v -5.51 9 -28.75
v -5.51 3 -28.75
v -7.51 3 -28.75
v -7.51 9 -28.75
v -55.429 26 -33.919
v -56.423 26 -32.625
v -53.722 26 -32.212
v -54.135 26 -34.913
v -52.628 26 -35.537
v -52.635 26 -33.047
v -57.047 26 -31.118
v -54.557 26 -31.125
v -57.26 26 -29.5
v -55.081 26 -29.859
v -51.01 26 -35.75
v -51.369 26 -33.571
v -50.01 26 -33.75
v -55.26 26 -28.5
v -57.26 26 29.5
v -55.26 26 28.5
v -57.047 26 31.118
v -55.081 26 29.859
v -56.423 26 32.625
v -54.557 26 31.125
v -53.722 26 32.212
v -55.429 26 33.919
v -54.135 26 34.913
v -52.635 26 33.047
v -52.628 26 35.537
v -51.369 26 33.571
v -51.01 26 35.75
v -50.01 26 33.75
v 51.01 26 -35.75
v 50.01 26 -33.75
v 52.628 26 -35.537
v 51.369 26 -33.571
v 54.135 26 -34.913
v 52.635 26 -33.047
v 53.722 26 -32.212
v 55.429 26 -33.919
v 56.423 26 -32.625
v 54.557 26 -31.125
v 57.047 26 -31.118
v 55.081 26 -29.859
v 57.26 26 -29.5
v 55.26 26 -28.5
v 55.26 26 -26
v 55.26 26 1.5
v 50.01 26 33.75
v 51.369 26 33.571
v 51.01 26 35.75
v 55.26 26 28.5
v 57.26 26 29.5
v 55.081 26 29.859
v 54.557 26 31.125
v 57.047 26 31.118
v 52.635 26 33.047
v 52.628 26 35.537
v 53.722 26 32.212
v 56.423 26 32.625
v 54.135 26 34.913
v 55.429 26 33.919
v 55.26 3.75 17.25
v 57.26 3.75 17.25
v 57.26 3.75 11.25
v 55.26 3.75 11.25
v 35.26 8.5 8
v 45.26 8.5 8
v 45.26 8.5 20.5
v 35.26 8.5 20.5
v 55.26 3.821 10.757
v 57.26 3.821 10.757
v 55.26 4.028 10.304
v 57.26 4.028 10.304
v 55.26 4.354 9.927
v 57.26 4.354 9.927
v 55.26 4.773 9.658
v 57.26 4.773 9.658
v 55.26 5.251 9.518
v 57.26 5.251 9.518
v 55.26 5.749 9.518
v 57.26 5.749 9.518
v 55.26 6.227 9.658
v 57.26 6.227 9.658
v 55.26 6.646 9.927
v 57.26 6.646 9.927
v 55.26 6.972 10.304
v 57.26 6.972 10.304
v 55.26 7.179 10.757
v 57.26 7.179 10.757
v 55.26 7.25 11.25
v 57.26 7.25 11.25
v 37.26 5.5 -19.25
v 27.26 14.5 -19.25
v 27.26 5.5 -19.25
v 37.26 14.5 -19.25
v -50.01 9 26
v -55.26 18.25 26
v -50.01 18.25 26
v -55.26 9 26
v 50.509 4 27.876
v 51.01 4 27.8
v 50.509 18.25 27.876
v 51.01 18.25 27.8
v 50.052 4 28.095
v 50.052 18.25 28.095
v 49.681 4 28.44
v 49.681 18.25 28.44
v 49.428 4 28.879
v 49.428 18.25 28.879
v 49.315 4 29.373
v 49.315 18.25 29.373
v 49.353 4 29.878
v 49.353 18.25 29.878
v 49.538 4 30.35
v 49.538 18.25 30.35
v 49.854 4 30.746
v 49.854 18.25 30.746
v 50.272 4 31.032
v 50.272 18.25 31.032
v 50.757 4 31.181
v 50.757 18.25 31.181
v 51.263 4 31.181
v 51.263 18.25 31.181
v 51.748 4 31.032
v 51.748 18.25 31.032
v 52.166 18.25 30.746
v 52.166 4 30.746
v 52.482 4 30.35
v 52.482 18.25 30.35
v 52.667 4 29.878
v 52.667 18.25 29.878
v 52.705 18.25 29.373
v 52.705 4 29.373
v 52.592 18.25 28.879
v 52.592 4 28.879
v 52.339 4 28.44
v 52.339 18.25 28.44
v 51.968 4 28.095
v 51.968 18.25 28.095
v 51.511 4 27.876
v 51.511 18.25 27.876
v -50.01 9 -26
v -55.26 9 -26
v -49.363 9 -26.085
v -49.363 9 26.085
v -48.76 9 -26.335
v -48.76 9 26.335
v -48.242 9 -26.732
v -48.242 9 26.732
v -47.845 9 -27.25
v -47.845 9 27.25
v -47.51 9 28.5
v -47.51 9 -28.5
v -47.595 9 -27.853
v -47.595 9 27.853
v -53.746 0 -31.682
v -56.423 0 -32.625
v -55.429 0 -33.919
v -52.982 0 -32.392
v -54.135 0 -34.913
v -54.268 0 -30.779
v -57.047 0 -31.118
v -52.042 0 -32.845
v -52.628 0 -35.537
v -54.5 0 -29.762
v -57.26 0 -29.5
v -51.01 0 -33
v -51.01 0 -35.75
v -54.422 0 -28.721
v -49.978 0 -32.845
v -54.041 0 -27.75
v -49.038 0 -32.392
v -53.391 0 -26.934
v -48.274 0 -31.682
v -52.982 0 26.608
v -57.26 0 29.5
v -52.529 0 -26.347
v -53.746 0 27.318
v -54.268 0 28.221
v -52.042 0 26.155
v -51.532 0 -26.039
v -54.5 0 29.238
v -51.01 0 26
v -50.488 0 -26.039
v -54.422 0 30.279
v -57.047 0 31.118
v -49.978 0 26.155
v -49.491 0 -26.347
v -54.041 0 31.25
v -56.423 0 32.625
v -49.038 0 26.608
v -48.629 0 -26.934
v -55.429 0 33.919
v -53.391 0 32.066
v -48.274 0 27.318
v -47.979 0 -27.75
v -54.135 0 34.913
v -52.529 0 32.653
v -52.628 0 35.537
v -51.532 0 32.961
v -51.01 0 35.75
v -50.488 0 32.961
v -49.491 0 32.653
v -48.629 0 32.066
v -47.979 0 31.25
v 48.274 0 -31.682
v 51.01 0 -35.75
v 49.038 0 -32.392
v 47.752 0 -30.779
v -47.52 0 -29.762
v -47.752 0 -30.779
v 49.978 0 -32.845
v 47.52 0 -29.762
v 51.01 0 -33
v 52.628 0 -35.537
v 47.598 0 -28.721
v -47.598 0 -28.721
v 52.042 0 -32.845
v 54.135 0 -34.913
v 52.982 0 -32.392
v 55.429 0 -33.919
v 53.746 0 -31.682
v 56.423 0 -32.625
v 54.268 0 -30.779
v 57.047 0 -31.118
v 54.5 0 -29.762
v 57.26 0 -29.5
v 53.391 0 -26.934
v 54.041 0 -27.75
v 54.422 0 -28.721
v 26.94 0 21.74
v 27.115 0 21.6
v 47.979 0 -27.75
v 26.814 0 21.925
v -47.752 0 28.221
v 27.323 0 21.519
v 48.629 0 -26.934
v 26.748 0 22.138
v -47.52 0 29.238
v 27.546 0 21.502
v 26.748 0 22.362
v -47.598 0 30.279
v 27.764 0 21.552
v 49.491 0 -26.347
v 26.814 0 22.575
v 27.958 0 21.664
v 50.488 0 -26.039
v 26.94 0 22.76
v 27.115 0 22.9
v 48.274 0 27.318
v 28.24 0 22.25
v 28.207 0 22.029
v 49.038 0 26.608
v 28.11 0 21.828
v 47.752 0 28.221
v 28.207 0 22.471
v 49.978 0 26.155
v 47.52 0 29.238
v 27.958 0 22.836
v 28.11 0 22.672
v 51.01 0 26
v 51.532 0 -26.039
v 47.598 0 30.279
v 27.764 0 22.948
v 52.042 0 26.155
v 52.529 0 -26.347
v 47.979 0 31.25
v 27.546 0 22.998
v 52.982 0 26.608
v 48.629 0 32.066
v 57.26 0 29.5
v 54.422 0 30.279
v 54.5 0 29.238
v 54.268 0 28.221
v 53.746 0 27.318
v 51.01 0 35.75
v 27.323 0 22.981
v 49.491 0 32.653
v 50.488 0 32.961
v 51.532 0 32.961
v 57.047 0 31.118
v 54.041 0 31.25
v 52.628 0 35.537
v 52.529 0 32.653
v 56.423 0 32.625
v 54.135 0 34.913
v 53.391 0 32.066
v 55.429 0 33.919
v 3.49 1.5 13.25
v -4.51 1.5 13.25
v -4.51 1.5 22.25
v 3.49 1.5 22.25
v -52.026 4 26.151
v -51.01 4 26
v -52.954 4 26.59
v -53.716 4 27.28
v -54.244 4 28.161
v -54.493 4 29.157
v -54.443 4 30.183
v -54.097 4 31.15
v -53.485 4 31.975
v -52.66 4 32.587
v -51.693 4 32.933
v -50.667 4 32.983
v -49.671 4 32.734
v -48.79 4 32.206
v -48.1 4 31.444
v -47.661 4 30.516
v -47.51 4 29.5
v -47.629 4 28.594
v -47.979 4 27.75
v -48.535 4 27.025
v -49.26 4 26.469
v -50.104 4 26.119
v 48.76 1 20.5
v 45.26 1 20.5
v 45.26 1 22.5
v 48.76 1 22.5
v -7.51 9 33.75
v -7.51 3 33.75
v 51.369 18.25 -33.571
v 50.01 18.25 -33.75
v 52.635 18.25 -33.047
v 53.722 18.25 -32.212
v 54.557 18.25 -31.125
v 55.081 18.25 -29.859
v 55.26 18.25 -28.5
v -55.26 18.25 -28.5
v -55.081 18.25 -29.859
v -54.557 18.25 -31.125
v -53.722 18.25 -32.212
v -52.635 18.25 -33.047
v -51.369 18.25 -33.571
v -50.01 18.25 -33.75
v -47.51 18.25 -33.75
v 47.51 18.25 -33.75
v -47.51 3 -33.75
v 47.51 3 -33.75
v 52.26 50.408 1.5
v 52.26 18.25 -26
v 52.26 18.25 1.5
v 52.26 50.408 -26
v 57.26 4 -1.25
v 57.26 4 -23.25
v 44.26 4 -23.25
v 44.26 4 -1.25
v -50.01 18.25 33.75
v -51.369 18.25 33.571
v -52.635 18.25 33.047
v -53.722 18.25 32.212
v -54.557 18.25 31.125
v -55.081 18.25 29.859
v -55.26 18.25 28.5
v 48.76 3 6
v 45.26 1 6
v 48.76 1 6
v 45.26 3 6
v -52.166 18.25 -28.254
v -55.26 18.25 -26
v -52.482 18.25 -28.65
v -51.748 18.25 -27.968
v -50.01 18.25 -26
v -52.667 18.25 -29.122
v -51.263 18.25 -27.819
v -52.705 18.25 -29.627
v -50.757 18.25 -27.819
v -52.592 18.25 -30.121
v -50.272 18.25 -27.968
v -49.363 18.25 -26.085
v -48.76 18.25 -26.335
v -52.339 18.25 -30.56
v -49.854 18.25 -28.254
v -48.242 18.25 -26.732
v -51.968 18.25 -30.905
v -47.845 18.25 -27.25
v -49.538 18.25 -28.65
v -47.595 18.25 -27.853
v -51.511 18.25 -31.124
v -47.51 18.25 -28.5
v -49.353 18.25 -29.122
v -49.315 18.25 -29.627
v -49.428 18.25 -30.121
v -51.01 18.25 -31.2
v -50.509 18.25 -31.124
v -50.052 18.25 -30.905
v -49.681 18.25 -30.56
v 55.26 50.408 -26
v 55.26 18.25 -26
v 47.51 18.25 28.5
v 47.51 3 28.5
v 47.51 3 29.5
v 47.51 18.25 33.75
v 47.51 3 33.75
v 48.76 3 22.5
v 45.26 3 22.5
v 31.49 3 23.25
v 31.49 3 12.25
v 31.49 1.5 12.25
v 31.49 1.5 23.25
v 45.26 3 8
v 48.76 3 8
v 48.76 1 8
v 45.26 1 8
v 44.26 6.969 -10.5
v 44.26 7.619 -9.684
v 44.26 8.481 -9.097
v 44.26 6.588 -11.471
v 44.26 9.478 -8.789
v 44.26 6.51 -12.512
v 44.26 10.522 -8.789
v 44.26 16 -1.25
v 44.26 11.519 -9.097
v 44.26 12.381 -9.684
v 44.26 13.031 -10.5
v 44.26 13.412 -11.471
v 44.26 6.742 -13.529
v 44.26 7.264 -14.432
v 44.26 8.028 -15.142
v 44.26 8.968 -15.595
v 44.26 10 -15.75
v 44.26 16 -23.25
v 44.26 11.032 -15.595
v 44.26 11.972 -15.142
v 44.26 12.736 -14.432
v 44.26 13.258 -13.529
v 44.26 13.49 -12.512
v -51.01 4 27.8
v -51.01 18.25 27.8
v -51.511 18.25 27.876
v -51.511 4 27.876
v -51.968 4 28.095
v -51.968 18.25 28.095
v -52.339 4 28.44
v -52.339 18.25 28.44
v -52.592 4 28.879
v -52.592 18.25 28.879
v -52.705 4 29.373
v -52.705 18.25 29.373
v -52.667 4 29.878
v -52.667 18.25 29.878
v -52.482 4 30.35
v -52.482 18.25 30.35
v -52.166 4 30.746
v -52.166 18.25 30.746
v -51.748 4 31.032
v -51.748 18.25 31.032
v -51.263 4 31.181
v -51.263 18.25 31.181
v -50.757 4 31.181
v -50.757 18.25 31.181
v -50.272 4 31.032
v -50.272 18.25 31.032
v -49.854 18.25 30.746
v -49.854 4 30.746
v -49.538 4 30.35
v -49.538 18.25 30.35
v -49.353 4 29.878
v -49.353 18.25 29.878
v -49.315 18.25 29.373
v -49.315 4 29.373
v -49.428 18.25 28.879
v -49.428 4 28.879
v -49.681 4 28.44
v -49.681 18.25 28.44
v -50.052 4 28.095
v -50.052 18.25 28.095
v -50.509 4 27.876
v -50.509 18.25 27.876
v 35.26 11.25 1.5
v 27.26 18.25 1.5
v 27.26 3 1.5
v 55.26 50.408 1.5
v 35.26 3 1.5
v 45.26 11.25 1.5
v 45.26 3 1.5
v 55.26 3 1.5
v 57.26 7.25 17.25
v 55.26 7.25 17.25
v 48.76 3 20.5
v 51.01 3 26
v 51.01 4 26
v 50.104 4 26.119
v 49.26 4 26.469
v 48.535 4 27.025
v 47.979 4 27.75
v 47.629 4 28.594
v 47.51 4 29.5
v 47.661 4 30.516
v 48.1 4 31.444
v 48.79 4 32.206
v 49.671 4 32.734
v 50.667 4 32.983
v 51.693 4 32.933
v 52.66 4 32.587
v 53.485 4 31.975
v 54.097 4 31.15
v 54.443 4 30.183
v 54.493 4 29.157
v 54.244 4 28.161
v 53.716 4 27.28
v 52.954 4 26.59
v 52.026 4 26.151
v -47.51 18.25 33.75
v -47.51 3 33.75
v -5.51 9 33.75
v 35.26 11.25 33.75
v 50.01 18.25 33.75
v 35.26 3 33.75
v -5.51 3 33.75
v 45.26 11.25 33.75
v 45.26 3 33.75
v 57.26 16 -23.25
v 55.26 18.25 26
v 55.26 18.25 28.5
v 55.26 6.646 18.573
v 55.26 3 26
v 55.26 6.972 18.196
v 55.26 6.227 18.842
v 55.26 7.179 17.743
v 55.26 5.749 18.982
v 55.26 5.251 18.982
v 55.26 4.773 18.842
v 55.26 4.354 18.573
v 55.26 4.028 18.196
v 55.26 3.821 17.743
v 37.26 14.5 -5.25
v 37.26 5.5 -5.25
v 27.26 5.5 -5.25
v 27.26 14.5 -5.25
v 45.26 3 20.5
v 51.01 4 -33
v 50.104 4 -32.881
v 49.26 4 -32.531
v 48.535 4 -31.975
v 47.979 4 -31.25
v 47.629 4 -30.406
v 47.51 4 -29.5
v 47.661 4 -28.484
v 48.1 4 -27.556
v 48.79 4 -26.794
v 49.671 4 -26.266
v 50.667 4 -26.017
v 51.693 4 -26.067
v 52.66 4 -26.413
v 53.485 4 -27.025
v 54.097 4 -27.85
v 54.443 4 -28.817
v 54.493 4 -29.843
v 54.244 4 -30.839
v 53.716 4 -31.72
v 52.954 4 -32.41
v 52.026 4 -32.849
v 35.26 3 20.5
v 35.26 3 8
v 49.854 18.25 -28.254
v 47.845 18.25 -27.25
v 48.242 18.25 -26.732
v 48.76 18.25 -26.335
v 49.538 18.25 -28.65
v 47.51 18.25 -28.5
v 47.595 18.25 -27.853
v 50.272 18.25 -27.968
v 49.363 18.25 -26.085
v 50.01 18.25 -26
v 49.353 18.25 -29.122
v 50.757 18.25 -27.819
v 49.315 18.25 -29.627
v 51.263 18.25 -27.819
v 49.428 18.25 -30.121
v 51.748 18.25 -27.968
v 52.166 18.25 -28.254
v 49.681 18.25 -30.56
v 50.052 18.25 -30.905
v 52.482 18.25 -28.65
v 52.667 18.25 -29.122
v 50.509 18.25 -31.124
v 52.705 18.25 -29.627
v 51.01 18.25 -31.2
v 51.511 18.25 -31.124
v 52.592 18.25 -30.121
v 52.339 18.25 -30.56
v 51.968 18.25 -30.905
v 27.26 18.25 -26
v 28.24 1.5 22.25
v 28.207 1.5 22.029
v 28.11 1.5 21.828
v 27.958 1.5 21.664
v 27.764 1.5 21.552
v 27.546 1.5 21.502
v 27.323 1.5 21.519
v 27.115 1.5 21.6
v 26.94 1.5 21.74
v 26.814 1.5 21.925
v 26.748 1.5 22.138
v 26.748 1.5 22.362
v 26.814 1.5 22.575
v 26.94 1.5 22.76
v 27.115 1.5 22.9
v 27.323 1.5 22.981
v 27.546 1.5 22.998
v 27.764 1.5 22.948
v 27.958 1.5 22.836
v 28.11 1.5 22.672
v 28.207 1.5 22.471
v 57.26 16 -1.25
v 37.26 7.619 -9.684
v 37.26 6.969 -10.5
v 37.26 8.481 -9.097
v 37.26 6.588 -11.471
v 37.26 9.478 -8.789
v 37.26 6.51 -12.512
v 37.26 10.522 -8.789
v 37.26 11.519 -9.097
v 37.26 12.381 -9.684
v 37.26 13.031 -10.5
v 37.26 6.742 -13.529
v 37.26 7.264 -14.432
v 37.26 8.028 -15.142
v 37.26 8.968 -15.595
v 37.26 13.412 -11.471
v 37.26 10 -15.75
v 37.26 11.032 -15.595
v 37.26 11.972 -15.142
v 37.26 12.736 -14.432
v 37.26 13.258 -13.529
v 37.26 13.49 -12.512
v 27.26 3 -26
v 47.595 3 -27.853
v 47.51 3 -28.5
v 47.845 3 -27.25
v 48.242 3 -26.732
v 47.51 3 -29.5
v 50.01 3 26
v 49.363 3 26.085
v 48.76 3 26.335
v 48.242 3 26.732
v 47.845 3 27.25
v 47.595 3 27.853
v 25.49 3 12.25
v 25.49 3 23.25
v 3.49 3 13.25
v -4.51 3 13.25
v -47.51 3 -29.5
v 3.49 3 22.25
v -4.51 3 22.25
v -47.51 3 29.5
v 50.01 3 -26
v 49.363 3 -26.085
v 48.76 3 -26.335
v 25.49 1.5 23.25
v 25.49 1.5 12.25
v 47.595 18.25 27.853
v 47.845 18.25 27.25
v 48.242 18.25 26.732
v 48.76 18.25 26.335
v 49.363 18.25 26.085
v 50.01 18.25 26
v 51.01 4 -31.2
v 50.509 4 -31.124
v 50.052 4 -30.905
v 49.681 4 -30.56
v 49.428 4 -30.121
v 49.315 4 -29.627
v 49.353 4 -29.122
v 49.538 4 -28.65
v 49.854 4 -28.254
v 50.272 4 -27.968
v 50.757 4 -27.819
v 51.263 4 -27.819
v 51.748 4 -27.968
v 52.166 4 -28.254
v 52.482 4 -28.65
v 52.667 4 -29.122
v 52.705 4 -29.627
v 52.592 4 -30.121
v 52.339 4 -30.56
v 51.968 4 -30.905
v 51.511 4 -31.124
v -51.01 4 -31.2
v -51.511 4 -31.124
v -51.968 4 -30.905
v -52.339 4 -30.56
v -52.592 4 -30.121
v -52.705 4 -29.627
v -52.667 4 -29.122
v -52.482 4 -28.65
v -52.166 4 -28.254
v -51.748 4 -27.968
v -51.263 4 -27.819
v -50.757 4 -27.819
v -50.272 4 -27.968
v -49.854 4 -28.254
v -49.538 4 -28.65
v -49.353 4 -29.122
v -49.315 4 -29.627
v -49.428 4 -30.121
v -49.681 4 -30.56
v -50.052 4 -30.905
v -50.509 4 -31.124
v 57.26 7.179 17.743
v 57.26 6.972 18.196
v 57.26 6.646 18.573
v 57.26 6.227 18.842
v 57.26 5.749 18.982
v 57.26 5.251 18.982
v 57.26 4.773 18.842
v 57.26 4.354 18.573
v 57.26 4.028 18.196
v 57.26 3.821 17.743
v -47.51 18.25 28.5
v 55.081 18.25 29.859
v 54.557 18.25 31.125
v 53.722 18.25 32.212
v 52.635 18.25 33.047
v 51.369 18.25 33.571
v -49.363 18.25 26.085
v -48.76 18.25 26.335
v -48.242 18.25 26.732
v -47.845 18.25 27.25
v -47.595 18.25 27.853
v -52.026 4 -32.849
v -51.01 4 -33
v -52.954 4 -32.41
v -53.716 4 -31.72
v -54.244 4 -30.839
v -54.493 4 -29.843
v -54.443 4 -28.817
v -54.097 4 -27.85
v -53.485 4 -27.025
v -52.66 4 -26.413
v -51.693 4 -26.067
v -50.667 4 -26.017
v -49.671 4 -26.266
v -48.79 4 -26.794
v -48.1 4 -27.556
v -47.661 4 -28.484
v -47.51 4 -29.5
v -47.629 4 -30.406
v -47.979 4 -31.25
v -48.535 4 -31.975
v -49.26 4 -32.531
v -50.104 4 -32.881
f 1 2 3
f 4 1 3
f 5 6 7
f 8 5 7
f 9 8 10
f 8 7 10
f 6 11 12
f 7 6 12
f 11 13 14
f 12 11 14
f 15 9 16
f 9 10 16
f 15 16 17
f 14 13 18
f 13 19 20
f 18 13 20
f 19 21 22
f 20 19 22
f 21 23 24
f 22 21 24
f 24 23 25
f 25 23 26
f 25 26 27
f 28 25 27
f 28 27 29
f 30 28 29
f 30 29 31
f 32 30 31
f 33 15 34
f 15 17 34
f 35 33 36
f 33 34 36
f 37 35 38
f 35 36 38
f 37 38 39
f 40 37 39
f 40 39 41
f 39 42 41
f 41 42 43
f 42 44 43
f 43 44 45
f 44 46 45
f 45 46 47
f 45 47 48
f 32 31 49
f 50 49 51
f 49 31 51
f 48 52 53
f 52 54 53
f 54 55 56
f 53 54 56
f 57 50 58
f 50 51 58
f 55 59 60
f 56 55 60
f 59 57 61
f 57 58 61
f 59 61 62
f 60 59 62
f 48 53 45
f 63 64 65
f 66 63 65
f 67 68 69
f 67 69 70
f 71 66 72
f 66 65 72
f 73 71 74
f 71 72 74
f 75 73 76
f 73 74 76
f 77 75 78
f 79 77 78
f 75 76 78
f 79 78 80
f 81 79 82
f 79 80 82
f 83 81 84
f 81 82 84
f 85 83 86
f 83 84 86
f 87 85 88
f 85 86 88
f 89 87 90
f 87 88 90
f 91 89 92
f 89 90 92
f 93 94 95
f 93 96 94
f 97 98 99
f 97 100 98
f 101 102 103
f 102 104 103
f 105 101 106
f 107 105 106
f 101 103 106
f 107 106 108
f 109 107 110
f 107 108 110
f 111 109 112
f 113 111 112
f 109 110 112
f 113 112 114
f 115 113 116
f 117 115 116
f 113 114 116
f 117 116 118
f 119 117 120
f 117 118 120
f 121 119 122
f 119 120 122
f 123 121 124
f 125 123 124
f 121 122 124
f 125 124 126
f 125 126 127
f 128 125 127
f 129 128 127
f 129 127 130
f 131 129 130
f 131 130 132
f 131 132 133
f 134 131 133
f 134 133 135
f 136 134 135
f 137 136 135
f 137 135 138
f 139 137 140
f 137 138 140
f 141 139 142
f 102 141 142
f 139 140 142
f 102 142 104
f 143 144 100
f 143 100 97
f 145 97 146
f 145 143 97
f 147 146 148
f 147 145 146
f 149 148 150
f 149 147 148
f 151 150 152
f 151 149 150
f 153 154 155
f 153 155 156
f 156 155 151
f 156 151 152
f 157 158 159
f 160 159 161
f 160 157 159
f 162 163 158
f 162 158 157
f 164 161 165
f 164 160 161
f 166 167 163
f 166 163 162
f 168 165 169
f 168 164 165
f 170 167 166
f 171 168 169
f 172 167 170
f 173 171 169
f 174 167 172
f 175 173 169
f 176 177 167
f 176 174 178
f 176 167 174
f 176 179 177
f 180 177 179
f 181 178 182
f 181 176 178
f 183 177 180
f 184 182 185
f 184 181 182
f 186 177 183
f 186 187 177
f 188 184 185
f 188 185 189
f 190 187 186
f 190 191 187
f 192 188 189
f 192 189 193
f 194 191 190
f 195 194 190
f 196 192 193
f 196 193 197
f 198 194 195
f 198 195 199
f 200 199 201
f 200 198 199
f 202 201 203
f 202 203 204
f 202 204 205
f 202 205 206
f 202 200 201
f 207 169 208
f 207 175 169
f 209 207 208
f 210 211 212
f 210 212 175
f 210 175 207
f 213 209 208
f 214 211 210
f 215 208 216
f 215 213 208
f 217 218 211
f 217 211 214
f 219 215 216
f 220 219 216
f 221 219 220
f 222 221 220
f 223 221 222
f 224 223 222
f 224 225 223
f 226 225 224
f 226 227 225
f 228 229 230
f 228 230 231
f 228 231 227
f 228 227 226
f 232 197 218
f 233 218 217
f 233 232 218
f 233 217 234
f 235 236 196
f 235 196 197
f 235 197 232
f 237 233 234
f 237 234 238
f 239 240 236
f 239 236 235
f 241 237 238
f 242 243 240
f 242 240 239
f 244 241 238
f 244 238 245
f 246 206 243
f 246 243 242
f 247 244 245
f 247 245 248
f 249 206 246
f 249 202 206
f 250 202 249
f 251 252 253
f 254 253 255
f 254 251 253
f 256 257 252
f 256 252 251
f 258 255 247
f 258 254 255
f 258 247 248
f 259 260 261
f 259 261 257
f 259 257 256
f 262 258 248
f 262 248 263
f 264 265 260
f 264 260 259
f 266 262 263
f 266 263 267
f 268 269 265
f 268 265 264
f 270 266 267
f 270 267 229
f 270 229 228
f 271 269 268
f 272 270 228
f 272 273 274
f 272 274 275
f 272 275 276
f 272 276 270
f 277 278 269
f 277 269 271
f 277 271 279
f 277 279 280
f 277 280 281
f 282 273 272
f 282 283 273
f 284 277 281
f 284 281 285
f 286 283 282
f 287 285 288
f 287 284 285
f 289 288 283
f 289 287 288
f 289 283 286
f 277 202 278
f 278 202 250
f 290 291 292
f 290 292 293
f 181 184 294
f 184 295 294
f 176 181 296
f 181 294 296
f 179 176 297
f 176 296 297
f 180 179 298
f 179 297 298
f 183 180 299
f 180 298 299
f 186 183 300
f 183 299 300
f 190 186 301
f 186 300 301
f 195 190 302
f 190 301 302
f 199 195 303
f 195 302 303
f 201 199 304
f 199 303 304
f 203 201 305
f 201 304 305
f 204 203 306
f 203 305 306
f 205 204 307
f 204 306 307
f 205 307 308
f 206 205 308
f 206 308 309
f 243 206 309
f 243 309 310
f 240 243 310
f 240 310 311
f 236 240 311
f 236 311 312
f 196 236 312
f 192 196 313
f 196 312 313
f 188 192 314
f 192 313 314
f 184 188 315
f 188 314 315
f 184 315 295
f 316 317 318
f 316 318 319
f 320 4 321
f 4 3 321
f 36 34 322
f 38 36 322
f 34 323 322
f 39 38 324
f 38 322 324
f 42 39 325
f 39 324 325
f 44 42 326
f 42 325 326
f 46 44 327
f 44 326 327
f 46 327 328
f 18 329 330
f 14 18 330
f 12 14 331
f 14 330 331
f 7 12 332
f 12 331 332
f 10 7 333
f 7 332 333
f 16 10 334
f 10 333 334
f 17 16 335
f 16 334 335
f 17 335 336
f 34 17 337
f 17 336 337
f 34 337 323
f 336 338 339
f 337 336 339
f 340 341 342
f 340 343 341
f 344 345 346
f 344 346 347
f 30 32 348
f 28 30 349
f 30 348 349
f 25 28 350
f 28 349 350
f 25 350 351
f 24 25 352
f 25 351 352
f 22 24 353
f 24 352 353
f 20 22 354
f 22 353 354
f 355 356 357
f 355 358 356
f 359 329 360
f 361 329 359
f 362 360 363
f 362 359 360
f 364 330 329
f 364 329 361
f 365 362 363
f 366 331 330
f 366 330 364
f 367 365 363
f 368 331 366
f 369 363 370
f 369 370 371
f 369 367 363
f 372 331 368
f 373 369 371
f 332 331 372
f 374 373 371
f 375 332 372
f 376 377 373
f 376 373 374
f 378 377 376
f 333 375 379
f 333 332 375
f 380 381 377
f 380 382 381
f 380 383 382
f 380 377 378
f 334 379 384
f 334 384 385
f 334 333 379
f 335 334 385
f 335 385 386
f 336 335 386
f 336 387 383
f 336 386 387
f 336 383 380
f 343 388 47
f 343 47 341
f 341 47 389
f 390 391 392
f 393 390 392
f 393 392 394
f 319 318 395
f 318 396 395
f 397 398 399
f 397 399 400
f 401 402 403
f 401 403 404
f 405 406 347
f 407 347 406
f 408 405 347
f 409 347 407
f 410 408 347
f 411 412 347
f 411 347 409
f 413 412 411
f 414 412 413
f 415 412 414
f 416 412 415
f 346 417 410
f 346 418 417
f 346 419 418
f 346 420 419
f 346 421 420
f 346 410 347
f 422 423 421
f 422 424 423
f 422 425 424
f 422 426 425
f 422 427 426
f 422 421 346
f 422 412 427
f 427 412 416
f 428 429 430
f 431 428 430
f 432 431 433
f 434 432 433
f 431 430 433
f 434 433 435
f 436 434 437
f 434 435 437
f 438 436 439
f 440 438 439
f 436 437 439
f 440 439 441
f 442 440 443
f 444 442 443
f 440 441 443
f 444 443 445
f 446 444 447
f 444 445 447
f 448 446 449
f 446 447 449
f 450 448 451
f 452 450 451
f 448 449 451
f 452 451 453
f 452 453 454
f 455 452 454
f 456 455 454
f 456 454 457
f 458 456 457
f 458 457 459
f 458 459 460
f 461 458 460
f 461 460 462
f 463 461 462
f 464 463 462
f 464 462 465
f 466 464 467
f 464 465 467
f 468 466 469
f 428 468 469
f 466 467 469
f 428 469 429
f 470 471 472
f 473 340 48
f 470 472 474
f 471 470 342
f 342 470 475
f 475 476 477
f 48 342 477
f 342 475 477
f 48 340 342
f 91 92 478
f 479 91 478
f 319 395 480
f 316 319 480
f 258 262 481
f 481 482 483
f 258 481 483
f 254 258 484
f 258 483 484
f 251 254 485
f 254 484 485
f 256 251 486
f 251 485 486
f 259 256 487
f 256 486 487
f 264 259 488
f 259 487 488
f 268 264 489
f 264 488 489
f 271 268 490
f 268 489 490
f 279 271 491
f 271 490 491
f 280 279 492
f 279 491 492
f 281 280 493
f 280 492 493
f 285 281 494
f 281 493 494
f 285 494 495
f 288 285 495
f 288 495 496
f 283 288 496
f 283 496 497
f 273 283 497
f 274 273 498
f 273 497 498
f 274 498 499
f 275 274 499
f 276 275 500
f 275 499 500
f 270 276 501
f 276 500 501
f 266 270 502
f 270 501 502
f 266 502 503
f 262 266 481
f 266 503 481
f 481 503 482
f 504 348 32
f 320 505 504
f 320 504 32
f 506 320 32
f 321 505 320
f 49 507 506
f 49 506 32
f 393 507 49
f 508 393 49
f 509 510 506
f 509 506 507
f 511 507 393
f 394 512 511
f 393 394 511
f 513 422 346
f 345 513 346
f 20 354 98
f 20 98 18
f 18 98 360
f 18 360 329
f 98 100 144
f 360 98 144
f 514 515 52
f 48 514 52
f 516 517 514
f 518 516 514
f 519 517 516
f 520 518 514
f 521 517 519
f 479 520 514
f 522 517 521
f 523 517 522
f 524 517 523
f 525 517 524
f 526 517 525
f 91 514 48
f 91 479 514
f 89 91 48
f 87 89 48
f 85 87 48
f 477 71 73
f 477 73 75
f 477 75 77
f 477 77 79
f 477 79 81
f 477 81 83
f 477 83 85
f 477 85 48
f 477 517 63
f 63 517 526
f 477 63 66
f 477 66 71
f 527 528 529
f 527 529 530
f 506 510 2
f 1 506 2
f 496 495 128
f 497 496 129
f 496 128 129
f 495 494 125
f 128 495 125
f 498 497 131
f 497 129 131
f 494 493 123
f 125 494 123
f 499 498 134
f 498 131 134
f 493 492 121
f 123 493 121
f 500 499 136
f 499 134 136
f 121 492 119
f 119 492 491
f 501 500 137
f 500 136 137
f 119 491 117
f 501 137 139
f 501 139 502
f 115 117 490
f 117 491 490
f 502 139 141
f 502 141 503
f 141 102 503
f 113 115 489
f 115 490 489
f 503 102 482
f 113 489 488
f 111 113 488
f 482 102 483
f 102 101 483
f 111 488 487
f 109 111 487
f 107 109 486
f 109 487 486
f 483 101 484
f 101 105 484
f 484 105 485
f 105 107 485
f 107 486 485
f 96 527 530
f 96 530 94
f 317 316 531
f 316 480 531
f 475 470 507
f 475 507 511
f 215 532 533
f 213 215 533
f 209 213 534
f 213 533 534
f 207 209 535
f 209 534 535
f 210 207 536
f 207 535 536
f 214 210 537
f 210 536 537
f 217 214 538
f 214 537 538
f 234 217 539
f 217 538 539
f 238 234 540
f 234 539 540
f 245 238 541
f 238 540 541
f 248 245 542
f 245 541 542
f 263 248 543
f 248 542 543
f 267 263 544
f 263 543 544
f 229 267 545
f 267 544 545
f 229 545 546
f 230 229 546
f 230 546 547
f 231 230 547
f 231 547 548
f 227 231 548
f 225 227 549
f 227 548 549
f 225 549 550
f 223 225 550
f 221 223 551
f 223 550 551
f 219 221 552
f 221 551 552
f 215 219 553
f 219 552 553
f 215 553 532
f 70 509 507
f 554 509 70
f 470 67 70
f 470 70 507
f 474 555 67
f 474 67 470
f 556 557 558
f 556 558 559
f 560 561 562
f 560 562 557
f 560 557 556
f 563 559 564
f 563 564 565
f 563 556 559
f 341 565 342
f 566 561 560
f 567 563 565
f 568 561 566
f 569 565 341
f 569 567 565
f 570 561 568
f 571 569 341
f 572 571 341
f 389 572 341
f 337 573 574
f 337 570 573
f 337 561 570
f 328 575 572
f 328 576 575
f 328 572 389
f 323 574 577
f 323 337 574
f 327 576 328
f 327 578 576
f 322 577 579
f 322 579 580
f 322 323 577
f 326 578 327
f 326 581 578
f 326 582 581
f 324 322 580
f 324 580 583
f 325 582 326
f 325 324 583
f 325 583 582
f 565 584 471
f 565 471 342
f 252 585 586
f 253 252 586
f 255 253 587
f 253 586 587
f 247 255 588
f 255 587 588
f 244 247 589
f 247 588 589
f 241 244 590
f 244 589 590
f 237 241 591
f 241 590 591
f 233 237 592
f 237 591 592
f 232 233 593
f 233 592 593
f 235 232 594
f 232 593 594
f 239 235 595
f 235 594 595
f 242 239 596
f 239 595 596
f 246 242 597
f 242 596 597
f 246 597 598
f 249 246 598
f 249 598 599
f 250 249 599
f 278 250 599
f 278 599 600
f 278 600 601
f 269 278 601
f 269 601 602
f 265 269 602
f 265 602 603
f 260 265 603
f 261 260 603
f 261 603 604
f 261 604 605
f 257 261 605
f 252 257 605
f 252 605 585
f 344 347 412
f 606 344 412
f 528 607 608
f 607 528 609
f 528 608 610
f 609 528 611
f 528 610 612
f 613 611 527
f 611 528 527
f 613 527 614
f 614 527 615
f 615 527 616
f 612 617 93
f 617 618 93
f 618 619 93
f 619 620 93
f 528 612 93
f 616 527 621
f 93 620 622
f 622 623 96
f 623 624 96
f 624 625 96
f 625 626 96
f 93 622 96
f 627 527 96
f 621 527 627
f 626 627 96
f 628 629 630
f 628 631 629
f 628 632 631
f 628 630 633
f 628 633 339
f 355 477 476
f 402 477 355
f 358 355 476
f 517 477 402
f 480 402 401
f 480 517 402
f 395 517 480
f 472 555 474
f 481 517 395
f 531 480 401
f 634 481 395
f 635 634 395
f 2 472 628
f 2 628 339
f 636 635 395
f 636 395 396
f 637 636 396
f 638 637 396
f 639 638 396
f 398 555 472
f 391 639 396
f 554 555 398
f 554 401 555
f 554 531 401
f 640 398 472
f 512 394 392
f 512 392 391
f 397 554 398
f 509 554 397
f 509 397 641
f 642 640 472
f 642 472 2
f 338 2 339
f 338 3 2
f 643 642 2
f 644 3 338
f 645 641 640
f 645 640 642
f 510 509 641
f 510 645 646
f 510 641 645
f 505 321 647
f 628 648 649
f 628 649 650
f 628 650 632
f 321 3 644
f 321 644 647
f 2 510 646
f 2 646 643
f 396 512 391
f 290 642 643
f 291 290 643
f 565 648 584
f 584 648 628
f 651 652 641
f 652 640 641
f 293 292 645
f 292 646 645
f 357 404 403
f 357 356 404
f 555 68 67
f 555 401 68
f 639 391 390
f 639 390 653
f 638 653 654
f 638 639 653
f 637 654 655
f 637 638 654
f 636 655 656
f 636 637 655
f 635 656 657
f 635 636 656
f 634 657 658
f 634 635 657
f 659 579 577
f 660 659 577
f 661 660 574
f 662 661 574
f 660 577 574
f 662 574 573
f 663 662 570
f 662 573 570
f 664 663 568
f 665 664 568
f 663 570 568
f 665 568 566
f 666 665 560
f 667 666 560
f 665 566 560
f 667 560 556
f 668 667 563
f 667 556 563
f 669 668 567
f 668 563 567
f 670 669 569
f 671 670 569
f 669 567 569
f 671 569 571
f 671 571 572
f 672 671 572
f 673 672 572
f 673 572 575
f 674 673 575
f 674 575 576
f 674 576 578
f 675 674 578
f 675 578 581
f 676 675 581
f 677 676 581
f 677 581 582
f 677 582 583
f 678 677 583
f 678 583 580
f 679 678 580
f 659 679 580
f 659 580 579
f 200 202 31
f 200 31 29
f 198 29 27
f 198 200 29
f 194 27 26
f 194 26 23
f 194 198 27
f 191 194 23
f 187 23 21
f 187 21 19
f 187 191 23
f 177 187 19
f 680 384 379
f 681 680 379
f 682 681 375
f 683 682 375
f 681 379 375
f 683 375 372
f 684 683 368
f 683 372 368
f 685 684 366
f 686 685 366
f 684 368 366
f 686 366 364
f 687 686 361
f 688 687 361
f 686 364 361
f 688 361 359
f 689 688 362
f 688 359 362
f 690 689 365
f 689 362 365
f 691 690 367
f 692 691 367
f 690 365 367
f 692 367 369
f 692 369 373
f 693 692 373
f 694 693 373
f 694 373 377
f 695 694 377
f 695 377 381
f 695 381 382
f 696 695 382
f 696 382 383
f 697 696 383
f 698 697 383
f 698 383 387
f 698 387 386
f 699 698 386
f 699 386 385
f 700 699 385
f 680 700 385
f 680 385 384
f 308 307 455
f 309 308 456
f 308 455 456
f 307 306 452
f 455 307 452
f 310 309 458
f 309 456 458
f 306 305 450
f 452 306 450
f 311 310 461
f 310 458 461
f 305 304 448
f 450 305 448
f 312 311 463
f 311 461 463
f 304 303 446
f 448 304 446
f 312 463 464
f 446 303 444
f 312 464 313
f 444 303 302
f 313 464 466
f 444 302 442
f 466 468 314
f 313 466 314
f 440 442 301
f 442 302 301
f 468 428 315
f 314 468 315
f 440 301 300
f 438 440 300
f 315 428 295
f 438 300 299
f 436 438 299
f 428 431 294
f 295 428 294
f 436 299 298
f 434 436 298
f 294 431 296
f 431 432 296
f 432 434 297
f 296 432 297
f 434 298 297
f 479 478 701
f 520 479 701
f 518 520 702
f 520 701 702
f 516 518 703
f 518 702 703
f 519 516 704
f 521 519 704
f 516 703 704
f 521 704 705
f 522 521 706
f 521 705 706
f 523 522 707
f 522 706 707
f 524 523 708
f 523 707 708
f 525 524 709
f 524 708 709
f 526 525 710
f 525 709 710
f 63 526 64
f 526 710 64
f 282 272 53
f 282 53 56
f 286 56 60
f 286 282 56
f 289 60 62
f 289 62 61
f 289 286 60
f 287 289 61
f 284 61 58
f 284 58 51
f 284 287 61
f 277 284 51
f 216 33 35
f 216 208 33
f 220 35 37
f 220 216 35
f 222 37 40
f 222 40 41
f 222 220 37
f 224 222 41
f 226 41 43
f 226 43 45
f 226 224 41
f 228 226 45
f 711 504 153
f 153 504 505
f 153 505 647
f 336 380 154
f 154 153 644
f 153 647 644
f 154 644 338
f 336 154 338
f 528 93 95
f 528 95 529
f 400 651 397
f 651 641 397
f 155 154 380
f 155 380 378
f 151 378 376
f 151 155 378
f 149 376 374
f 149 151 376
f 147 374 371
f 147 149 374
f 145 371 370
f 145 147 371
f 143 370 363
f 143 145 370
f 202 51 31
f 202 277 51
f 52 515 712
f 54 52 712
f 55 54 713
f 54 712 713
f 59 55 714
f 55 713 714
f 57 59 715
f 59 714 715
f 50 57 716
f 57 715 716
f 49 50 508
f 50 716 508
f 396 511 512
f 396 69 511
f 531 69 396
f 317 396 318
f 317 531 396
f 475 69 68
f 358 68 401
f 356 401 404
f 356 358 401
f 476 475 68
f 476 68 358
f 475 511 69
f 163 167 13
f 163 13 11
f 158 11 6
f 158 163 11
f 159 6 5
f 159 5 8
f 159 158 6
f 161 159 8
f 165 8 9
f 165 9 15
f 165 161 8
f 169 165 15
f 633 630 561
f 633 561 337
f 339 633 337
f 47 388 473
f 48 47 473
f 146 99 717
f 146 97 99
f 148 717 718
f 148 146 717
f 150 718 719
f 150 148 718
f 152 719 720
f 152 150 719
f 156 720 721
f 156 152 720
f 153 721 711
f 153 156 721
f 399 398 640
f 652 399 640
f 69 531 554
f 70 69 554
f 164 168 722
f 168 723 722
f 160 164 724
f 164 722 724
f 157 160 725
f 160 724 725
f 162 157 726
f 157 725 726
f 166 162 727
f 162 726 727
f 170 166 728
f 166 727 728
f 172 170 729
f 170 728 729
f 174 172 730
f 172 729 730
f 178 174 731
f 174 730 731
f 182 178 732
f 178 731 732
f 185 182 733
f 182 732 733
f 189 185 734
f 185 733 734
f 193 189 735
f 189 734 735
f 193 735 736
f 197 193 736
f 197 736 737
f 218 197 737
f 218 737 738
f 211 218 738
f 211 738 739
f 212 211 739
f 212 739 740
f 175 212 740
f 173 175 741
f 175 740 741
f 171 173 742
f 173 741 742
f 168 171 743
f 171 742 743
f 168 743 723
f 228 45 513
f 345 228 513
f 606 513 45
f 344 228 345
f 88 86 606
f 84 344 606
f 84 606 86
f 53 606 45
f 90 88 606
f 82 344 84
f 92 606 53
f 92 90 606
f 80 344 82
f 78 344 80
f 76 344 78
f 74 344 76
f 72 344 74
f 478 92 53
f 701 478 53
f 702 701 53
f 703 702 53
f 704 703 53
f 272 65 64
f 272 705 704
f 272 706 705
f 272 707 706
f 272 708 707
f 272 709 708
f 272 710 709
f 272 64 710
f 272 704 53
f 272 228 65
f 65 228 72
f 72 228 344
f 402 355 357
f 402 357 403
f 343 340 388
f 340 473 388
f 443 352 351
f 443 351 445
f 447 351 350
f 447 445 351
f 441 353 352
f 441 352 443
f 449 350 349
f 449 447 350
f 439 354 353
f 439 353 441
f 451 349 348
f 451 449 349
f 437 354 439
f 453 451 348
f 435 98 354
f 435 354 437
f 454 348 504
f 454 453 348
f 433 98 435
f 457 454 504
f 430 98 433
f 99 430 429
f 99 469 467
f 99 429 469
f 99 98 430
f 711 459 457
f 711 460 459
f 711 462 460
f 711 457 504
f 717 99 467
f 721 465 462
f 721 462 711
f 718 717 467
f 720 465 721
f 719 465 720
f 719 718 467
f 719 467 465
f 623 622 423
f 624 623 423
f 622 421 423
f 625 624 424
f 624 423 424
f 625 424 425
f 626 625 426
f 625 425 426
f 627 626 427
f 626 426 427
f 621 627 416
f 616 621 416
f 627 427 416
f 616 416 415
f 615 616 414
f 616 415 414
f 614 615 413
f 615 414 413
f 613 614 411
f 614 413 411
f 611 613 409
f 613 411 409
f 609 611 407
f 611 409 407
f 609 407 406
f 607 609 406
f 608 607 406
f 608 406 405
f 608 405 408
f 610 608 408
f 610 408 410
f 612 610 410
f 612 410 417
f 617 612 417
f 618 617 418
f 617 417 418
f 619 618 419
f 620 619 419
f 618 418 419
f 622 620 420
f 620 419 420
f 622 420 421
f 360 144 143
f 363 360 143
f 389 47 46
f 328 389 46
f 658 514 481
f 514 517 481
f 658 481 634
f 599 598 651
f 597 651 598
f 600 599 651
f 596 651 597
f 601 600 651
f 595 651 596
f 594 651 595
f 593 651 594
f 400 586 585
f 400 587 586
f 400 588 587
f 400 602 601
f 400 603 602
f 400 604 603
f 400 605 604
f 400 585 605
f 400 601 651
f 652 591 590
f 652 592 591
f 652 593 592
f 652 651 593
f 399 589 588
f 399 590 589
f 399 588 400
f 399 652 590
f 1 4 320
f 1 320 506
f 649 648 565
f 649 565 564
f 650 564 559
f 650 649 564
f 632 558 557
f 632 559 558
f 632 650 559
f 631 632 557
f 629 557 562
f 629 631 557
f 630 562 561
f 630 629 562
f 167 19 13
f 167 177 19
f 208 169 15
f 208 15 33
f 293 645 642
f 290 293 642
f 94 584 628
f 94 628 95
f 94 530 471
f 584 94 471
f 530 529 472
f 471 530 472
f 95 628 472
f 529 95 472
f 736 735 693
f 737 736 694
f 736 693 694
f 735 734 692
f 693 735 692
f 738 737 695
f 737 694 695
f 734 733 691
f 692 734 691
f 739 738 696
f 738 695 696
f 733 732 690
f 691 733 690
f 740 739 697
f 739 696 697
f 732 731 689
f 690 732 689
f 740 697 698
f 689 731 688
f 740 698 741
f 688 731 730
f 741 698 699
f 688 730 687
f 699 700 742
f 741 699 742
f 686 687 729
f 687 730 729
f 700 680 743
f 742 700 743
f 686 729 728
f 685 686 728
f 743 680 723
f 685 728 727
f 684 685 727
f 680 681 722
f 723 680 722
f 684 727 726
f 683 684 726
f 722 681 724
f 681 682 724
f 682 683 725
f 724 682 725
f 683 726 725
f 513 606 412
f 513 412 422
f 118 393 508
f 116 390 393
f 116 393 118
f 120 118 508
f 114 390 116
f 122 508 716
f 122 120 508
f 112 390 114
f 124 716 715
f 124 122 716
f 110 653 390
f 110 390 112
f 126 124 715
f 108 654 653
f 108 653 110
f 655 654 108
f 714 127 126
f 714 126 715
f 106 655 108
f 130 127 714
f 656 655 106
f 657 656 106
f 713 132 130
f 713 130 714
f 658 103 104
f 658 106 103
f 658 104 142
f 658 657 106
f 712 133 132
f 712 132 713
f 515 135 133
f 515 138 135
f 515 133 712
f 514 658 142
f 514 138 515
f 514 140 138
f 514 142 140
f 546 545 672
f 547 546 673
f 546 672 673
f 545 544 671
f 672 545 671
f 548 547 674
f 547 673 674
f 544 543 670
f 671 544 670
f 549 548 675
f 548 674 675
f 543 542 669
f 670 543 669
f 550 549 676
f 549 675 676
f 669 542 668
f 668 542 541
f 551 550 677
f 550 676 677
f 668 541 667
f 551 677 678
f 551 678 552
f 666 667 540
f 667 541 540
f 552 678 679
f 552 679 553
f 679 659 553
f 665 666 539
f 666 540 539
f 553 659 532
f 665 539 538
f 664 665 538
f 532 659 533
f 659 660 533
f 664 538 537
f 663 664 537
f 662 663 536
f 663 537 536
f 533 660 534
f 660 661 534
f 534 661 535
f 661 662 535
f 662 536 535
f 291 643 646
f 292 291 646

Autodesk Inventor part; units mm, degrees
ref_plane "YZ Plane" through (0, 0, 0) normal (1, 0, 0) x (0, 1, 0)
ref_plane "XZ Plane" through (0, 0, 0) normal (0, 1, 0) x (-1, 0, 0)
sketch "Sketch1" plane through (0, 0, 0) normal (0, 1, 0) x (-1, 0, 0)
  line L0 (-55.26, 33.75) -> (55.26, 33.75)
  line L1 (55.26, 33.75) -> (55.26, -33.75)
  line L2 (55.26, -33.75) -> (-55.26, -33.75)
  line L3 (-55.26, -33.75) -> (-55.26, 33.75)
  line L4 (-55.26, 33.75) -> (55.26, -33.75) construction
  line L5 (55.26, 33.75) -> (-55.26, -33.75) construction
  point P0 (0, 0)
  dimension "d0" = 110.52
  dimension "d1" = 67.5
extrude "Extrusion1" add sketch "Sketch1" along normal blind 3
fillet "Fillet1" radius 5.25 4 edges at (-55.26, 1.5, 33.75) (55.26, 1.5, 33.75) (55.26, 1.5, -33.75) (-55.26, 1.5, -33.75)
sketch "Sketch2" plane through (0, 0, 0) normal (0, -1, 0) x (1, 0, 0)
  arc A0 (-55.26, -28.5) -> (-50.01, -33.75) centre (-50.01, -28.5) ccw construction
  line L0 (50.01, -33.75) -> (-50.01, -33.75) construction
  arc A1 (50.01, -33.75) -> (55.26, -28.5) centre (50.01, -28.5) ccw construction
  line L1 (55.26, 28.5) -> (55.26, -28.5) construction
  arc A2 (55.26, 28.5) -> (50.01, 33.75) centre (50.01, 28.5) ccw construction
  line L2 (-50.01, 33.75) -> (50.01, 33.75) construction
  arc A3 (-50.01, 33.75) -> (-55.26, 28.5) centre (-50.01, 28.5) ccw construction
  line L3 (-55.26, -28.5) -> (-55.26, 28.5) construction
  circle A4 centre (-50.01, 28.5) radius 5.25
  line L4 (-50.01, 33.75) -> (50.01, 33.75) construction
  line L5 (-50.01, 33.75) -> (50.01, 33.75)
  line L6 (-55.26, 28.5) -> (-55.26, -28.5)
  circle A5 centre (-50.01, -28.5) radius 5.25
  line L7 (-50.01, -33.75) -> (50.01, -33.75)
  circle A6 centre (50.01, -28.5) radius 5.25
  line L8 (55.26, 28.5) -> (55.26, -28.5)
  circle A7 centre (50.01, 28.5) radius 5.25
  line L9 (51.01, 35.75) -> (-51.01, 35.75)
  line L10 (-57.26, 29.5) -> (-57.26, -29.5)
  line L11 (-51.01, -35.75) -> (51.01, -35.75)
  line L12 (57.26, -29.5) -> (57.26, 29.5)
  line L13 (57.26, 35.75) -> (-57.26, -35.75) construction
  line L14 (-57.26, 35.75) -> (57.26, -35.75) construction
  arc A8 (-51.01, 35.75) -> (-57.26, 29.5) centre (-51.01, 29.5) ccw
  arc A9 (-57.26, -29.5) -> (-51.01, -35.75) centre (-51.01, -29.5) ccw
  arc A10 (51.01, -35.75) -> (57.26, -29.5) centre (51.01, -29.5) ccw
  arc A11 (57.26, 29.5) -> (51.01, 35.75) centre (51.01, 29.5) ccw
  point P0 (0, 0)
  point P1 (55.26, -28.5)
  point P2 (50.01, 33.75)
  dimension "d5" = 2
  dimension "d6" = 2
  dimension "d7" = 6.25
  dimension "d8" = 6.25
extrude "Extrusion2" add sketch "Sketch2" against normal blind 26
sketch "Sketch3" plane through (55.26, 3, 28.5) normal (-1, 0, 0) x (0, 0, 1)
  line L0 (0, 0) -> (-57, 0) construction
  line L1 (-57, 23) -> (0, 23) construction
  line L2 (-54.5, 0) -> (-27, 0)
  line L3 (-27, 0) -> (-27, 47.408)
  line L4 (-27, 47.408) -> (-54.5, 47.408)
  line L5 (-54.5, 47.408) -> (-54.5, 0)
  line L6 (-62.25, 0) -> (-62.25, 23) construction
  point P0 (-28.5, -3)
  point P1 (-54.5, 23.704)
  point P2 (-40.75, 47.408)
  dimension "d11" = 7.75
  dimension "d12" = 27.5
  dimension "d13" = 24.408
extrude "Extrusion3" add sketch "Sketch3" along normal blind 3
sketch "Sketch4" plane through (0, 3, 0) normal (0, 1, 0) x (1, 0, 0)
  arc A0 (55.26, 28.5) -> (50.01, 33.75) centre (50.01, 28.5) ccw construction
  line L0 (50.01, 33.75) -> (-50.01, 33.75) construction
  line L1 (-50.01, -33.75) -> (50.01, -33.75) construction
  arc A1 (50.01, -33.75) -> (55.26, -28.5) centre (50.01, -28.5) ccw construction
  line L2 (55.26, -28.5) -> (55.26, -1.5) construction
  circle A2 centre (50.01, 28.5) radius 2.5
  circle A3 centre (50.01, -28.5) radius 2.5
  line L3 (47.51, -28.5) -> (47.51, -33.75)
  line L4 (55.26, -26) -> (50.01, -26)
  line L5 (0, 0) -> (0, -21.4582)
  line L6 (0, 0) -> (16.5599, 0)
  line L7 (47.51, 28.5) -> (47.51, 33.75)
  line L8 (55.26, 26) -> (50.01, 26)
  circle A4 centre (-50.01, 28.5) radius 2.5
  circle A5 centre (-50.01, -28.5) radius 2.5
  line L9 (-47.51, -28.5) -> (-47.51, -33.75)
  line L10 (-55.26, -26) -> (-50.01, -26)
  line L11 (-47.51, 28.5) -> (-47.51, 33.75)
  line L12 (-55.26, 26) -> (-50.01, 26)
  line L13 (55.26, 28.5) -> (55.26, -28.5)
  line L14 (50.01, 33.75) -> (5.9104, 33.75)
  arc A6 (55.26, 28.5) -> (50.01, 33.75) centre (50.01, 28.5) ccw
  arc A7 (50.01, -33.75) -> (55.26, -28.5) centre (50.01, -28.5) ccw
  line L15 (50.01, -33.75) -> (5.9104, -33.75)
  line L16 (-55.26, 26) -> (-55.26, 28.5) construction
  arc A8 (-50.01, 33.75) -> (-55.26, 28.5) centre (-50.01, 28.5) ccw construction
  line L17 (-50.01, 33.75) -> (50.01, 33.75) construction
  arc A9 (-55.26, -28.5) -> (-50.01, -33.75) centre (-50.01, -28.5) ccw construction
  line L18 (-55.26, -28.5) -> (-55.26, -1.5) construction
  line L19 (-55.26, 28.5) -> (-55.26, -28.5)
  line L20 (-50.01, 33.75) -> (-5.9104, 33.75)
  arc A10 (-50.01, 33.75) -> (-55.26, 28.5) centre (-50.01, 28.5) ccw
  arc A11 (-55.26, -28.5) -> (-50.01, -33.75) centre (-50.01, -28.5) ccw
  line L21 (-50.01, -33.75) -> (-5.9104, -33.75)
  point P0 (-47.51, 28.5)
  dimension "d16" = 5
  dimension "d17" = 5
extrude "Extrusion4" add sketch "Sketch4" along normal blind 15.25
ref_plane "Work Plane1" through (0, 11.25, 0) normal (0, 1, 0) x (1, 0, 0)
sketch "Sketch5" plane through (0, 3, 0) normal (0, 1, 0) x (1, 0, 0)
  line L0 (-47.51, -33.75) -> (47.51, -33.75) construction
  arc A0 (-55.26, -28.5) -> (-50.01, -33.75) centre (-50.01, -28.5) ccw construction
  line L1 (-47.51, 28.5) -> (-55.26, 28.5)
  line L2 (-55.26, 28.5) -> (-55.26, -28.5)
  line L3 (-55.26, -28.5) -> (-47.51, -28.5)
  line L4 (-47.51, -28.5) -> (-47.51, 28.5)
  line L5 (-7.51, -33.75) -> (-5.51, -33.75)
  line L6 (-5.51, -33.75) -> (-5.51, 28.75)
  line L7 (-5.51, 28.75) -> (-7.51, 28.75)
  line L8 (-7.51, 28.75) -> (-7.51, -33.75)
  line L9 (-1.51, -33.75) -> (0.49, -33.75)
  dimension "d21" = 2
  dimension "d22" = 40
extrude "Extrusion5" add sketch "Sketch5" along normal blind 6
sketch "Sketch6" plane through (0, 3, 0) normal (0, 1, 0) x (1, 0, 0)
  line L0 (55.26, -1.5) -> (52.26, -1.5) construction
  line L1 (52.26, 26) -> (27.26, 26)
  line L2 (27.26, 26) -> (27.26, -1.5)
  line L3 (27.26, -1.5) -> (52.26, -1.5)
  line L4 (52.26, -1.5) -> (52.26, 26)
  line L5 (57.26, -29.5) -> (57.26, 29.5) construction
  point P0 (0, 0)
  point P1 (27.26, 12.25)
  dimension "d29" = 30
extrude "Extrusion6" add sketch "Sketch6" along normal up to surface (15.25 mm away)
sketch "Sketch7" plane through (57.26, 0, 29.5) normal (1, 0, 0) x (0, 0, -1)
  line L0 (59, 0) -> (0, 0) construction
  line L1 (0, 26) -> (59, 26) construction
  line L2 (48.75, 5.5) -> (34.75, 5.5)
  line L3 (34.75, 5.5) -> (34.75, 14.5)
  line L4 (34.75, 14.5) -> (48.75, 14.5)
  line L5 (48.75, 14.5) -> (48.75, 5.5)
  line L6 (48.75, 5.5) -> (34.75, 14.5) construction
  line L7 (34.75, 5.5) -> (48.75, 14.5) construction
  circle A0 centre (41.75, 10) radius 3.5
  line L8 (30.75, 16) -> (52.75, 16)
  line L9 (52.75, 16) -> (52.75, 4)
  line L10 (52.75, 4) -> (30.75, 4)
  line L11 (30.75, 4) -> (30.75, 16)
  line L12 (30.75, 16) -> (52.75, 4) construction
  line L13 (52.75, 16) -> (30.75, 4) construction
  line L14 (52.75, 16) -> (52.75, 26)
  line L15 (55.5, 50.408) -> (55.5, 18.25) construction
  line L16 (55.5, 26) -> (52.75, 26)
  line L17 (28, 26) -> (28, 50.408) construction
  line L18 (28, 26) -> (30.75, 26)
  line L19 (30.75, 16) -> (30.75, 26)
  point P0 (29.5, 0)
  dimension "d32" = 14
  dimension "d33" = 9
  dimension "d34" = 7
  dimension "d35" = 22
  dimension "d36" = 12
  dimension "d37" = 4
extrude "Extrusion7" cut sketch "Sketch7" against normal blind 13 contours L2 L3 L4 L5 | A0 | L8 L9 L10 L11
extrude "Extrusion8" cut sketch "Sketch7" against normal blind 20 contours A0
extrude "Extrusion9" cut sketch "Sketch7" against normal up to surface (10 mm away) from surface at -20 contours L2 L3 L4 L5 | A0
sketch "Sketch8" plane through (0, 3, 0) normal (0, 1, 0) x (1, 0, 0)
  line L0 (55.26, -1.5) -> (27.26, -1.5) construction
  line L1 (47.51, 33.75) -> (-47.51, 33.75) construction
  line L2 (-5.51, 28.75) -> (-5.51, -33.75) construction
  line L3 (-1.51, 25.75) -> (16.49, 25.75)
  line L4 (16.49, 25.75) -> (16.49, -1.75)
  line L5 (16.49, -1.75) -> (-1.51, -1.75)
  line L6 (-1.51, -1.75) -> (-1.51, 25.75)
  line L7 (-3.51, -8.5) -> (31.49, -8.5)
  line L8 (31.49, -8.5) -> (31.49, -27)
  line L9 (31.49, -27) -> (-3.51, -27)
  line L10 (-3.51, -27) -> (-3.51, -8.5)
  line L11 (57.26, -29.5) -> (57.26, 29.5) construction
  line L12 (-4.51, -22.25) -> (3.49, -22.25)
  line L13 (3.49, -22.25) -> (3.49, -13.25)
  line L14 (3.49, -13.25) -> (-4.51, -13.25)
  line L15 (-4.51, -13.25) -> (-4.51, -22.25)
  line L16 (-4.51, -22.25) -> (3.49, -13.25) construction
  line L17 (3.49, -22.25) -> (-4.51, -13.25) construction
  line L18 (25.49, -23.25) -> (31.49, -23.25)
  line L19 (31.49, -23.25) -> (31.49, -12.25)
  line L20 (31.49, -12.25) -> (25.49, -12.25)
  line L21 (25.49, -12.25) -> (25.49, -23.25)
  line L22 (25.49, -23.25) -> (31.49, -12.25) construction
  line L23 (31.49, -23.25) -> (25.49, -12.25) construction
  circle A0 centre (27.49, -22.25) radius 0.75
  point P0 (0, 0)
  point P1 (-0.51, -17.75)
  point P2 (-4.51, -17.75)
  point P3 (-3.51, -17.75)
  point P4 (28.49, -17.75)
  point P5 (31.49, -17.75)
  dimension "d44" = 18
  dimension "d45" = 27.5
  dimension "d46" = 8
  dimension "d48" = 35
  dimension "d49" = 18.5
  dimension "d52" = 7
  dimension "d59" = 2
  dimension "d60" = 4
  dimension "d75" = 1
  dimension "d76" = 9
  dimension "d77" = 8
  dimension "d78" = 11
  dimension "d79" = 6
  dimension "d80" = 1.5
  dimension "d81" = 1
  dimension "d82" = 2
sketch "Sketch9" plane through (55.26, 26, 1.5) normal (0, 0, 1) x (1, 0, 0)
  line L0 (-3, -7.75) -> (-28, -7.75) construction
  line L1 (0, -23) -> (-28, -23) construction
  line L2 (-20, -14.75) -> (-10, -14.75)
  line L3 (-10, -14.75) -> (-10, -17.5)
  line L4 (-10, -17.5) -> (-20, -17.5)
  line L5 (-20, -17.5) -> (-20, -14.75)
  line L6 (2, -22) -> (2, -10) construction
  point P0 (-55.26, -26)
  point P1 (-20, -16.125)
  point P2 (-10, -16.125)
  point P3 (2, -16)
  point P4 (-15, -14.75)
  dimension "d53" = 7
  dimension "d54" = 5.5
  dimension "d55" = 10
  dimension "d56" = 17
extrude "Extrusion10" add sketch "Sketch9" along normal up to surface (32.25 mm away)
sketch "Sketch10" plane through (57.26, 0, 29.5) normal (1, 0, 0) x (0, 0, -1)
  line L0 (12.25, 5.5) -> (18.25, 5.5) construction
  line L1 (12.25, 3.75) -> (18.25, 3.75)
  line L2 (18.25, 7.25) -> (12.25, 7.25)
  arc A0 (12.25, 7.25) -> (12.25, 3.75) centre (12.25, 5.5) ccw
  arc A1 (18.25, 3.75) -> (18.25, 7.25) centre (18.25, 5.5) ccw
  line L3 (3.5, 3) -> (3.5, 18.25) construction
  line L4 (3.5, 3) -> (28, 3) construction
  point P0 (29.5, 0)
  point P1 (15.25, 5.5)
  point P2 (20, 5.5)
  point P3 (10.5, 5.5)
  dimension "d61" = 3.5
  dimension "d62" = 9.5
  dimension "d63" = 7
  dimension "d64" = 0.75
extrude "Extrusion11" cut sketch "Sketch10" against normal blind 10
sketch "Sketch11" plane through (0, 3, 0) normal (0, 1, 0) x (1, 0, 0)
  line L0 (55.26, -26) -> (55.26, -1.5) construction
  line L1 (48.76, -8) -> (55.26, -8)
  line L2 (55.26, -8) -> (55.26, -20.5)
  line L3 (55.26, -20.5) -> (48.76, -20.5)
  line L4 (48.76, -20.5) -> (48.76, -8)
  line L5 (48.76, -8) -> (55.26, -20.5) construction
  line L6 (55.26, -8) -> (48.76, -20.5) construction
  line L7 (45.26, -1.5) -> (45.26, -33.75) construction
  line L8 (48.76, -8) -> (45.26, -8)
  line L9 (45.26, -8) -> (45.26, -6)
  line L10 (45.26, -6) -> (48.76, -6)
  line L11 (48.76, -6) -> (48.76, -8)
  line L12 (48.76, -20.5) -> (45.26, -20.5)
  line L13 (45.26, -20.5) -> (45.26, -22.5)
  line L14 (45.26, -22.5) -> (48.76, -22.5)
  line L15 (48.76, -22.5) -> (48.76, -20.5)
  line L16 (50.01, -26) -> (55.26, -26) projected
  point P0 (0, 0)
  point P1 (52.01, -14.25)
  point P2 (55.26, -13.75)
  point P3 (55.26, -14.25)
  dimension "d67" = 12.5
  dimension "d68" = 6.5
  dimension "d69" = 2
  dimension "d70" = 2
  dimension "d102" = 11.75
extrude "Extrusion12" cut sketch "Sketch11" against normal blind 2 contours L15 L14 L13 L12 | L8 L9 L10 L11
sketch "Sketch12" plane through (0, 3, 0) normal (0, 1, 0) x (1, 0, 0)
  line L0 (35.26, -1.5) -> (35.26, -33.75) construction
  line L1 (35.26, -1.5) -> (45.26, -1.5)
  line L2 (45.26, -1.5) -> (45.26, -8)
  line L3 (45.26, -8) -> (35.26, -8)
  line L4 (35.26, -8) -> (35.26, -1.5)
  line L5 (35.26, -33.75) -> (45.26, -33.75)
  line L6 (45.26, -33.75) -> (45.26, -20.5)
  line L7 (45.26, -20.5) -> (35.26, -20.5)
  line L8 (35.26, -20.5) -> (35.26, -33.75)
  point P0 (0, 0)
extrude "Extrusion13" add sketch "Sketch12" along normal up to surface (8.25 mm away)
extrude "Extrusion14" cut sketch "Sketch8" against normal blind 1.5 contours L14 L13 L12 L10 | L10 L12 L15 L14 | L8 L18 L21 L20 | A0
extrude "Extrusion15" cut sketch "Sketch8" against normal through all contours A0
sketch "Sketch14" plane through (0, 0, 0) normal (0, -1, 0) x (1, 0, 0)
  arc A0 (51.01, -35.75) -> (57.26, -29.5) centre (51.01, -29.5) ccw projected
  arc A1 (55.26, 28.5) -> (50.01, 33.75) centre (50.01, 28.5) ccw projected
  arc A2 (57.26, 29.5) -> (51.01, 35.75) centre (51.01, 29.5) ccw projected
  arc A3 (-51.01, 35.75) -> (-57.26, 29.5) centre (-51.01, 29.5) ccw projected
  arc A4 (-50.01, 33.75) -> (-55.26, 28.5) centre (-50.01, 28.5) ccw projected
  arc A5 (-57.26, -29.5) -> (-51.01, -35.75) centre (-51.01, -29.5) ccw projected
  arc A6 (-55.26, -28.5) -> (-50.01, -33.75) centre (-50.01, -28.5) ccw projected
  arc A7 (50.01, -33.75) -> (55.26, -28.5) centre (50.01, -28.5) ccw projected
  point P0 (0, 0)
hole "Hole2" at (51.01, 0, -29.5) at (-51.01, 0, -29.5) at (-51.01, 0, 29.5) at (51.01, 0, 29.5) direction (0, 1, 0) diameter 3.4 end through all counterbore diameter 7 counterbore depth 4
properties part number "bottom"
